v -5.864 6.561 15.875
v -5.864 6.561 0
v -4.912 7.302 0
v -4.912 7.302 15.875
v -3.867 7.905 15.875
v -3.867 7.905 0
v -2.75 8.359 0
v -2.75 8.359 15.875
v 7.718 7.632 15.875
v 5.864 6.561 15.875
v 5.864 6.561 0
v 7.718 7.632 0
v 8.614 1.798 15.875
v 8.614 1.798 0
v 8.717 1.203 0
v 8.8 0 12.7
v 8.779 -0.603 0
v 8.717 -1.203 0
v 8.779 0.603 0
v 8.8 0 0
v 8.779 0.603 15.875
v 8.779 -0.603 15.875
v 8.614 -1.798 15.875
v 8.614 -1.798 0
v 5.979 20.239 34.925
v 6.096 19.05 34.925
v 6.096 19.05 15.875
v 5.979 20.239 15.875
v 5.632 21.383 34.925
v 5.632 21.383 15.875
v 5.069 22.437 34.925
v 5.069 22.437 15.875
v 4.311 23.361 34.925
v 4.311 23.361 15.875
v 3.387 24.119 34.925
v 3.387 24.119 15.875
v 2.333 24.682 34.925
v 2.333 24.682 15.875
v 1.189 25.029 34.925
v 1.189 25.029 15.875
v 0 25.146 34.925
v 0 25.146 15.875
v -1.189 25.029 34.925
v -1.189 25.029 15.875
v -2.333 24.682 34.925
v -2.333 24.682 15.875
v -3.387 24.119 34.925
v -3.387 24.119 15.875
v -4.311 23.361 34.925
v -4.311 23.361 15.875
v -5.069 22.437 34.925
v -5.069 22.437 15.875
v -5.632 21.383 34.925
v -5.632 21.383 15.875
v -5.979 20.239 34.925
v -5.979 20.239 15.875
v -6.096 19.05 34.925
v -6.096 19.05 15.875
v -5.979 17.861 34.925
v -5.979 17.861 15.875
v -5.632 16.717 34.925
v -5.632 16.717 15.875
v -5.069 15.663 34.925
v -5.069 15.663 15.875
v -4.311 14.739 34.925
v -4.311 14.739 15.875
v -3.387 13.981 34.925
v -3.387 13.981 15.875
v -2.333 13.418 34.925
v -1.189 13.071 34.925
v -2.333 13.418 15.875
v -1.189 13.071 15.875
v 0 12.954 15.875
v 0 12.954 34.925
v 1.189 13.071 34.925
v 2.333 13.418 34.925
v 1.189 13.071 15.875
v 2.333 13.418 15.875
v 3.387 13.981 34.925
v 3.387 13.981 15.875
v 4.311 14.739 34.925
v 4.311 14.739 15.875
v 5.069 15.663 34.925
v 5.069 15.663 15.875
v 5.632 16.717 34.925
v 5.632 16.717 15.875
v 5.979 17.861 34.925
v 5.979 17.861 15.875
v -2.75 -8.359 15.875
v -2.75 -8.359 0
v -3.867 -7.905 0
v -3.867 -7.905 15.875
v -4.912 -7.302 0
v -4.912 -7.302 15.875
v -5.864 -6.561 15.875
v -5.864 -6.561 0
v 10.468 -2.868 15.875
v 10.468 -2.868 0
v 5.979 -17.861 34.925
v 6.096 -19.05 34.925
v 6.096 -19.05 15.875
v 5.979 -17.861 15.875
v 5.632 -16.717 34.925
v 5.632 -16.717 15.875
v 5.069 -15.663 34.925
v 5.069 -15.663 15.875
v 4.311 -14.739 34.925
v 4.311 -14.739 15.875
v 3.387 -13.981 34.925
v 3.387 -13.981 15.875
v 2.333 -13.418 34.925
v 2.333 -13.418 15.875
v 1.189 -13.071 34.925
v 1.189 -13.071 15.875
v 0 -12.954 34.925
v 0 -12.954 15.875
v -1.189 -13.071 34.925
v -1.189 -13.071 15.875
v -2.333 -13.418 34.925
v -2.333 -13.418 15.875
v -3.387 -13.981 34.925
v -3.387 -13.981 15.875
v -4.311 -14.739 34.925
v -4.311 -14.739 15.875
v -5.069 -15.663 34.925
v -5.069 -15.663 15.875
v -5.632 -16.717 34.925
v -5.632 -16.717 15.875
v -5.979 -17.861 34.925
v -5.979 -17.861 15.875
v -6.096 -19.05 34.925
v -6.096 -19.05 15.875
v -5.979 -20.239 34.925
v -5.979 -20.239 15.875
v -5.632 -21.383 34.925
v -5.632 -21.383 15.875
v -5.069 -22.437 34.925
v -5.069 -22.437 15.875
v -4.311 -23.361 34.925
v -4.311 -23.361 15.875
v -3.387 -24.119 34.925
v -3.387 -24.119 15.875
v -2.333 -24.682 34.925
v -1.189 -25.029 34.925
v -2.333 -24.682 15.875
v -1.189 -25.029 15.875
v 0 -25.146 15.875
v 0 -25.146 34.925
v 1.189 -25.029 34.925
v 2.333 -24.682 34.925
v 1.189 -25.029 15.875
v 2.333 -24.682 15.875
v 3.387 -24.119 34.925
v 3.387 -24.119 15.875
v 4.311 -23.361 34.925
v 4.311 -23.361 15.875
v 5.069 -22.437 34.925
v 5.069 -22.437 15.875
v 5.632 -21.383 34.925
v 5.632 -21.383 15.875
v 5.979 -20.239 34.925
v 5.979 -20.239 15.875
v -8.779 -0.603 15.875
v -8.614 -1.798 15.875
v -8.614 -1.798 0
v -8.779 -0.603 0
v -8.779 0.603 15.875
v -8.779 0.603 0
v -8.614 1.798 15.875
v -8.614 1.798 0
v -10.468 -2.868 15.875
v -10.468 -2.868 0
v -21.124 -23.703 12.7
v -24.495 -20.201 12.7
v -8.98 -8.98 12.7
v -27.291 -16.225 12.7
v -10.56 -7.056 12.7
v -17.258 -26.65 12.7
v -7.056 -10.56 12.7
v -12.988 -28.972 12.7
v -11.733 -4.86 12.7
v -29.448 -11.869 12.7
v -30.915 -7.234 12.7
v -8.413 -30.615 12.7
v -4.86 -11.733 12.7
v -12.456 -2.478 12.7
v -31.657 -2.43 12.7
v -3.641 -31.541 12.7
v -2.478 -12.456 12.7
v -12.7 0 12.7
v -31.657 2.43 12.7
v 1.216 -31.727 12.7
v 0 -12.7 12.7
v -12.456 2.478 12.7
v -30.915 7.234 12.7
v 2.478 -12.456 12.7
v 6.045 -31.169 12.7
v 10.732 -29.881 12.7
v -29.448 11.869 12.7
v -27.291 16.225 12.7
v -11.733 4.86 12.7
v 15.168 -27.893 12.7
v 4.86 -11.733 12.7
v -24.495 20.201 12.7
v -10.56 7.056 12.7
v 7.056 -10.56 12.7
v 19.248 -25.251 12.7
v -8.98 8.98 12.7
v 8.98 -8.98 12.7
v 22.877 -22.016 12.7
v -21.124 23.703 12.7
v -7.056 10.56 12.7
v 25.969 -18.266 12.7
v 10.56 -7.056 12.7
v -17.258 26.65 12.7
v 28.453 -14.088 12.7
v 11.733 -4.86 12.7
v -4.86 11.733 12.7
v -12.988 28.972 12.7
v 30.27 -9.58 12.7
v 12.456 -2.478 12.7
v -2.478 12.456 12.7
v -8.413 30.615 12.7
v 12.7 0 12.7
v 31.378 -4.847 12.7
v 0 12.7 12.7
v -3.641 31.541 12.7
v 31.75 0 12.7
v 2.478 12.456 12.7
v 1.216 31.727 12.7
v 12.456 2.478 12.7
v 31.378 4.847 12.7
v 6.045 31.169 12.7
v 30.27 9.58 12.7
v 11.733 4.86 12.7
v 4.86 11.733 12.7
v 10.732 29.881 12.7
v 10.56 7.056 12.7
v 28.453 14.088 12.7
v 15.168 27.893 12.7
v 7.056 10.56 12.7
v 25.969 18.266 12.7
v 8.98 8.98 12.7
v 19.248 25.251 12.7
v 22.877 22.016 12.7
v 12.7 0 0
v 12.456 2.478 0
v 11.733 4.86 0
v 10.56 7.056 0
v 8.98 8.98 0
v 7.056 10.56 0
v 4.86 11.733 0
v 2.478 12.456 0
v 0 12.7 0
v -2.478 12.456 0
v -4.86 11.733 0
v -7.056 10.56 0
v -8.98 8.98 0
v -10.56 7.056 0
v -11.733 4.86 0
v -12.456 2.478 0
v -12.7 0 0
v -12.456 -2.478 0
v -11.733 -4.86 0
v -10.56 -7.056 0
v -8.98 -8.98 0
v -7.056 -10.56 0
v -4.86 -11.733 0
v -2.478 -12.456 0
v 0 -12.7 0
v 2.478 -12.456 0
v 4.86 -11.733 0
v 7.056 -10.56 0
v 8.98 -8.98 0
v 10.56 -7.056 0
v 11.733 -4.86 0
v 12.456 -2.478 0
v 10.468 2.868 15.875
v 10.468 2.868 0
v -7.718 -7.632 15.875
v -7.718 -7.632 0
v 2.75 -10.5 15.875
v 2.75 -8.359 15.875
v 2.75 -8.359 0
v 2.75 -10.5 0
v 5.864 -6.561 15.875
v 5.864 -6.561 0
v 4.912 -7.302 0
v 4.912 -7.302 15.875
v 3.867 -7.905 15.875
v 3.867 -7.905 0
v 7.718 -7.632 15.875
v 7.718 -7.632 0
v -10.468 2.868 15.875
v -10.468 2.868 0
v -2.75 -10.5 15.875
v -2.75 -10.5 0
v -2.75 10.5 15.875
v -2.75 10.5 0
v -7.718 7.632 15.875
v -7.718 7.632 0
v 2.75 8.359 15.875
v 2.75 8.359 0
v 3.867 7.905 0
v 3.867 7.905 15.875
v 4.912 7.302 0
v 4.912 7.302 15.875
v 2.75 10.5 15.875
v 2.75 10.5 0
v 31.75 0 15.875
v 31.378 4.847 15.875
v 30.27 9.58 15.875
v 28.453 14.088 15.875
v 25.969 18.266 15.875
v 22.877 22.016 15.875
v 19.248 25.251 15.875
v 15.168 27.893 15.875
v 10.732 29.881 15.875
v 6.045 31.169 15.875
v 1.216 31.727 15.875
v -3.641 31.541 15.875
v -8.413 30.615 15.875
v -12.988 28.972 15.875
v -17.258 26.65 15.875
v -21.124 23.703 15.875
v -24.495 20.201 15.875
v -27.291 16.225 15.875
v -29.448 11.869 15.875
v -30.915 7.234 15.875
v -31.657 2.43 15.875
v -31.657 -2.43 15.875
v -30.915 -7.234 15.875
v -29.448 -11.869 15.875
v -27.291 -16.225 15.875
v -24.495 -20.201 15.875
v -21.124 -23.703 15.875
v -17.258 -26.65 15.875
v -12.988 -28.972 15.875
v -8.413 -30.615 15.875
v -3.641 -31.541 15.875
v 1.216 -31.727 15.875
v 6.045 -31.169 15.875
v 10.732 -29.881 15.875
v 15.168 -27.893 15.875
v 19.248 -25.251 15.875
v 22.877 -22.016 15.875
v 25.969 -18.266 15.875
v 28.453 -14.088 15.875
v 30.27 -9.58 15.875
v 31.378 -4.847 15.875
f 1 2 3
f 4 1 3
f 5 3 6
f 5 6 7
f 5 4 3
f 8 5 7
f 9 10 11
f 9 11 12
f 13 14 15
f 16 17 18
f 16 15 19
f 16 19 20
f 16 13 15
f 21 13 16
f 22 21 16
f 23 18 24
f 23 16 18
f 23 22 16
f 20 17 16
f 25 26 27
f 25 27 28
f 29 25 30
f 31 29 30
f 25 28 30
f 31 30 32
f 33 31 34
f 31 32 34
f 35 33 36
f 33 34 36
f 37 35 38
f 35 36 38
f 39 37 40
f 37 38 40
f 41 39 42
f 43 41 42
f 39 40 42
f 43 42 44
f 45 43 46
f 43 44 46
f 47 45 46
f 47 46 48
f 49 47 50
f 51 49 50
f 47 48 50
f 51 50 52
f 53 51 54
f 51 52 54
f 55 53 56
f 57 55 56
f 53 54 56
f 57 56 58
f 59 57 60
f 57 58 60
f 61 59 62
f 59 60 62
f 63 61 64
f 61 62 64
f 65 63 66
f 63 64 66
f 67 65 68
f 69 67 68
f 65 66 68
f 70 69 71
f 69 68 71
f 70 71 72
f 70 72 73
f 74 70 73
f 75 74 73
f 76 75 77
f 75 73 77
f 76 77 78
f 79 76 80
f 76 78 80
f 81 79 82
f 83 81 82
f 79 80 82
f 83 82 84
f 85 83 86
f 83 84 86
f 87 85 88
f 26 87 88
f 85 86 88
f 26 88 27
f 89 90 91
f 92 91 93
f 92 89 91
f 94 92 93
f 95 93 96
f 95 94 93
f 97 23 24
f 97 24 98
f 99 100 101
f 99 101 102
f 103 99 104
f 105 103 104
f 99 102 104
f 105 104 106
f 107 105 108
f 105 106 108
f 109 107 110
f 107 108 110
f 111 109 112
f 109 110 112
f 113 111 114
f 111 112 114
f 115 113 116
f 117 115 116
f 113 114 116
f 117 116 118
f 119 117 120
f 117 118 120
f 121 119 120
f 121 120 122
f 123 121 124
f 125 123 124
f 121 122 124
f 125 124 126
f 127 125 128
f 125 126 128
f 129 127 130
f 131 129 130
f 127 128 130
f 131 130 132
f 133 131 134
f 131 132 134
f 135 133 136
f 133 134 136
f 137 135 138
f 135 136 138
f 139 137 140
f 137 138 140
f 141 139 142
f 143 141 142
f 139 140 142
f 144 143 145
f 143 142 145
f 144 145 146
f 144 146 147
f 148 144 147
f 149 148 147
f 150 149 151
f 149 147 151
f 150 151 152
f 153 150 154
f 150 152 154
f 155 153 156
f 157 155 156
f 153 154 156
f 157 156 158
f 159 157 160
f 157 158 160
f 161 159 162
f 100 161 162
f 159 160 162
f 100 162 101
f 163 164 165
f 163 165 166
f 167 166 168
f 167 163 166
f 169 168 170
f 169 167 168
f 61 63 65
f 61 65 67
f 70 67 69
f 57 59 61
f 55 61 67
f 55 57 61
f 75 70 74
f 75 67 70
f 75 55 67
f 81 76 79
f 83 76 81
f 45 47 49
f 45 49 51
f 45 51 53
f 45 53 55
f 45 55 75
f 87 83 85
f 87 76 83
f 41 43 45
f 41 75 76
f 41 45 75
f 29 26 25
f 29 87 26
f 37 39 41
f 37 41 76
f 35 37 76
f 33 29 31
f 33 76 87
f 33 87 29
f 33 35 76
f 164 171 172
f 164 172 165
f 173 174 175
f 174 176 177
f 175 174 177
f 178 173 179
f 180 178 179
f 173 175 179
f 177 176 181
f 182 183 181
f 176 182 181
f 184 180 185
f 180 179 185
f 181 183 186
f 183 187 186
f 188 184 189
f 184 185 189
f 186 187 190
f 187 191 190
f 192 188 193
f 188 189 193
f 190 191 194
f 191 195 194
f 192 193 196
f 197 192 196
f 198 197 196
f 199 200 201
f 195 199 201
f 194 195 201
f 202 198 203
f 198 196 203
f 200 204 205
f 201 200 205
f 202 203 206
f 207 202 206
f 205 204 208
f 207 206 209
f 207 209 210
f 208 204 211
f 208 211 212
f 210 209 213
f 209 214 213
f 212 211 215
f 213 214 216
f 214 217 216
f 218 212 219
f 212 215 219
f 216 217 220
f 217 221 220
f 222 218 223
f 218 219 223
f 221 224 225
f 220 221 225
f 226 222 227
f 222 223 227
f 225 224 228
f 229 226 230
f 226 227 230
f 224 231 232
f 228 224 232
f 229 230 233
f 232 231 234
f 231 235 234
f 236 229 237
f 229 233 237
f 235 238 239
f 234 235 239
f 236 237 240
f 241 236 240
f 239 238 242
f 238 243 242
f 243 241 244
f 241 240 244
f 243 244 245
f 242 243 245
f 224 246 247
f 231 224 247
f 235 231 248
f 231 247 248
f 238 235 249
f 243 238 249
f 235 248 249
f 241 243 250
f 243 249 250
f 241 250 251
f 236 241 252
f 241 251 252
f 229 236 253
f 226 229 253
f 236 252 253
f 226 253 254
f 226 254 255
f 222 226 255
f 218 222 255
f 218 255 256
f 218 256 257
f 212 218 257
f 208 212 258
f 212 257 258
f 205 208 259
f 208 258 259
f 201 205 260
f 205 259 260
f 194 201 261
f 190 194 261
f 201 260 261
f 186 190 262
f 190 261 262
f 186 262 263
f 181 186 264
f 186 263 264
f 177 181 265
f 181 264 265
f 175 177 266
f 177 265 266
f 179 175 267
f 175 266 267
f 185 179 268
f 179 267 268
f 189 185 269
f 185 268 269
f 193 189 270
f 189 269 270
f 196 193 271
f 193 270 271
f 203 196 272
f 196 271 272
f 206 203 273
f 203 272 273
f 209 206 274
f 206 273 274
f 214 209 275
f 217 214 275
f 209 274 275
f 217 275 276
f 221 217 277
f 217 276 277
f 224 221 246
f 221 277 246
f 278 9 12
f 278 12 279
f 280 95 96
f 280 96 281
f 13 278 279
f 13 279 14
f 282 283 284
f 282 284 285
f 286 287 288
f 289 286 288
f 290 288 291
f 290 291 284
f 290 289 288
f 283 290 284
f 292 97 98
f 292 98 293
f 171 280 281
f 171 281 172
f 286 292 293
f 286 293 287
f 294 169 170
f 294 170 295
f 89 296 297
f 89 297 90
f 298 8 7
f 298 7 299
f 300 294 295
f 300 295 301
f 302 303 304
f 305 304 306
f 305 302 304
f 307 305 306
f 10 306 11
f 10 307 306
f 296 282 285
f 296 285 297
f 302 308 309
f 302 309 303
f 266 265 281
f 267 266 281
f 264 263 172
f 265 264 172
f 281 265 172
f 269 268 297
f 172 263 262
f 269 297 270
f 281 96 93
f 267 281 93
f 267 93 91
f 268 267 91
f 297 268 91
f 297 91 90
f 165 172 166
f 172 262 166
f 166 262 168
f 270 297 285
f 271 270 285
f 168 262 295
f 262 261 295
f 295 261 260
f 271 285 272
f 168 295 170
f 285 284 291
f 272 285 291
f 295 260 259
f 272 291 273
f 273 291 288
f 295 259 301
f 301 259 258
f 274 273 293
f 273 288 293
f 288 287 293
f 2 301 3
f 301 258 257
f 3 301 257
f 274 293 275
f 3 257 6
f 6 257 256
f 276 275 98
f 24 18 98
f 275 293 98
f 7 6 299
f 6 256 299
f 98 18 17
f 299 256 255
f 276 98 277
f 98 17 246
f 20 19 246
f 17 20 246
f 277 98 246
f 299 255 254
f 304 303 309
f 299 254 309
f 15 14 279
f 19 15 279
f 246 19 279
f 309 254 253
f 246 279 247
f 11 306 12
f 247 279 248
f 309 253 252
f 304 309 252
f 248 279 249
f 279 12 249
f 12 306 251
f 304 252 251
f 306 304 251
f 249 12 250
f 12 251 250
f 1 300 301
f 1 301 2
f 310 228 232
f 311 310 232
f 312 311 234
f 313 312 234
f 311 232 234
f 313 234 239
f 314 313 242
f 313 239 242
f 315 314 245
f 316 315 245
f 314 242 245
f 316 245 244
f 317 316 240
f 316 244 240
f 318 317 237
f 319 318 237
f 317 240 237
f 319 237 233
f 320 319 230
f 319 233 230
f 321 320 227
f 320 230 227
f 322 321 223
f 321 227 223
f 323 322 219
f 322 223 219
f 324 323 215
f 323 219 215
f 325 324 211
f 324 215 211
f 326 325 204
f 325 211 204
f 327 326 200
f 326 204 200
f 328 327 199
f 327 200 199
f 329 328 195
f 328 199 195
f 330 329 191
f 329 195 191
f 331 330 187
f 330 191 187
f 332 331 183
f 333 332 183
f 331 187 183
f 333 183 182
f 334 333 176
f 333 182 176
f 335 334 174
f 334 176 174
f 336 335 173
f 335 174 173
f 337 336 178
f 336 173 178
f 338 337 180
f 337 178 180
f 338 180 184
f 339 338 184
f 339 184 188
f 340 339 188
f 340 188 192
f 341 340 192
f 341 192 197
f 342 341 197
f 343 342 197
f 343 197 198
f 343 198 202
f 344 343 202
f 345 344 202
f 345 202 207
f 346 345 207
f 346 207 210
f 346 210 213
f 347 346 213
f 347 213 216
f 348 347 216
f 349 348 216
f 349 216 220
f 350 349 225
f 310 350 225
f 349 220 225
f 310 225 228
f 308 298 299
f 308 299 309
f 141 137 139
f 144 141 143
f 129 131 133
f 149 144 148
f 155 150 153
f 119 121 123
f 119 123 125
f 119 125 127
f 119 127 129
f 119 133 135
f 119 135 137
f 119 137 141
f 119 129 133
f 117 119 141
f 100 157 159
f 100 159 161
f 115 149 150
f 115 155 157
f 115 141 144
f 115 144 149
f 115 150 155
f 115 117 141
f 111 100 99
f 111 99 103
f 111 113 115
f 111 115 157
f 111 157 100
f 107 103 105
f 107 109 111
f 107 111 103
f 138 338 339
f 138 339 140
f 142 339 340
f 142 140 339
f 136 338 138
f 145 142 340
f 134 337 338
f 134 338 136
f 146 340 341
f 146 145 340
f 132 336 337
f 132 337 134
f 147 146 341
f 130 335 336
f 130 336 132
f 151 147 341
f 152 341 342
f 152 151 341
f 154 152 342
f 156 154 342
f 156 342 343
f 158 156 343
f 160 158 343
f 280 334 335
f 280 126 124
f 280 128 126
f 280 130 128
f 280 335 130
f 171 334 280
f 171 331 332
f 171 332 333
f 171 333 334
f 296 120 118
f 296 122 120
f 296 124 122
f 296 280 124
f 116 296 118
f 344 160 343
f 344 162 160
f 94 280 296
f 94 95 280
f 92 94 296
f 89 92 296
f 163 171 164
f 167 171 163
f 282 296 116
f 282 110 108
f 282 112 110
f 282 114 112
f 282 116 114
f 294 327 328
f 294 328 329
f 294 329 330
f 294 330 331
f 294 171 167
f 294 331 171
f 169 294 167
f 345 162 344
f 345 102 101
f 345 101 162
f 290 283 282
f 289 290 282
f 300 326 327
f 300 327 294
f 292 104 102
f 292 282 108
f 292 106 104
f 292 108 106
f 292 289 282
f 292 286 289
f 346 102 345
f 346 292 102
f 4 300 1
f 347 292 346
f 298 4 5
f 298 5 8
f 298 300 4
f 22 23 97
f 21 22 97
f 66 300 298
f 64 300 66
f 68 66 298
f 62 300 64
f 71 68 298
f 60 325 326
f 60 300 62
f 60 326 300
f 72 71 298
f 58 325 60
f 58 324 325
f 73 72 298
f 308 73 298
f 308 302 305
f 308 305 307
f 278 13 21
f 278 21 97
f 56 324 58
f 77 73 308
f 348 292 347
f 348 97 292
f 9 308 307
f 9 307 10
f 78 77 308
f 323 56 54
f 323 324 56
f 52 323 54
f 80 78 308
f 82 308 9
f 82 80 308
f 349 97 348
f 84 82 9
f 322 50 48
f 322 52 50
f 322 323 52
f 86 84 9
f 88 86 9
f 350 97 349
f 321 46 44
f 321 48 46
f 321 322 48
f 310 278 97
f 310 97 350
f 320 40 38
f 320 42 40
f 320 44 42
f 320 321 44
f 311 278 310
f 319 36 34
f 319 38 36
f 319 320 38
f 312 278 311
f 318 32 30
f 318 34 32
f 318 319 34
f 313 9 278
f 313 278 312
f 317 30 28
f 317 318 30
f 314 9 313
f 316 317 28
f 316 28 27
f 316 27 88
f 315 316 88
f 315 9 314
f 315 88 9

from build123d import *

# Parameters (mm, degrees)
F0_R     = 12.7
F1_DEPTH = 12.7
F4_R     = 31.75
F5_DEPTH = 3.175
F6_R     = 6.096
F7_DEPTH = 19.05
F8_DEPTH = 25.4


with BuildPart() as f1:
    # F0 (on Top) → F1 (new body)
    with BuildSketch(Plane.XY):
        Circle(F0_R)
        with BuildLine():
            ThreePointArc((8.614346, 1.798068), (8.753463, 0.903814), (8.8, 0))
            ThreePointArc((8.8, 0), (8.753463, -0.903814), (8.614346, -1.798068))
            Line((8.614346, -1.798068), (10.468267, -2.86843))
            Line((10.468267, -2.86843), (7.718267, -7.63157))
            Line((7.718267, -7.63157), (5.864346, -6.561208))
            ThreePointArc((5.864346, -6.561208), (4.4, -7.621024), (2.75, -8.359276))
            Line((2.75, -8.359276), (2.75, -10.5))
            Line((2.75, -10.5), (-2.75, -10.5))
            Line((-2.75, -10.5), (-2.75, -8.359276))
            ThreePointArc((-2.75, -8.359276), (-4.4, -7.621024), (-5.864346, -6.561208))
            Line((-5.864346, -6.561208), (-7.718267, -7.63157))
            Line((-7.718267, -7.63157), (-10.468267, -2.86843))
            Line((-10.468267, -2.86843), (-8.614346, -1.798068))
            ThreePointArc((-8.614346, -1.798068), (-8.8, 0), (-8.614346, 1.798068))
            Line((-8.614346, 1.798068), (-10.468267, 2.86843))
            Line((-10.468267, 2.86843), (-7.718267, 7.63157))
            Line((-7.718267, 7.63157), (-5.864346, 6.561208))
            ThreePointArc((-5.864346, 6.561208), (-4.4, 7.621024), (-2.75, 8.359276))
            Line((-2.75, 8.359276), (-2.75, 10.5))
            Line((-2.75, 10.5), (2.75, 10.5))
            Line((2.75, 10.5), (2.75, 8.359276))
            ThreePointArc((2.75, 8.359276), (4.4, 7.621024), (5.864346, 6.561208))
            Line((5.864346, 6.561208), (7.718267, 7.63157))
            Line((7.718267, 7.63157), (10.468267, 2.86843))
            Line((10.468267, 2.86843), (8.614346, 1.798068))
        make_face(mode=Mode.SUBTRACT)
    extrude(amount=F1_DEPTH)

    # F4 (on face) → F5 (join)
    with BuildSketch(Plane.XY.offset(12.7)):
        Circle(F4_R)
    extrude(amount=F5_DEPTH)

    # F6 (on face) → F7 (join)
    with BuildSketch(Plane.XY.offset(15.875)):
        with Locations((0, 19.05)):
            Circle(F6_R)
        with Locations((0, -19.05)):
            Circle(F6_R)
    extrude(amount=F7_DEPTH)

    # F5_face (on face) → F8 (cut)
    with BuildSketch(Plane.XY.offset(15.875)):
        with BuildLine():
            Line((5.864346, 6.561208), (7.718267, 7.63157))
            Line((7.718267, 7.63157), (10.468267, 2.86843))
            Line((10.468267, 2.86843), (8.614346, 1.798068))
            ThreePointArc((8.614346, 1.798068), (8.8, 0), (8.614346, -1.798068))
            Line((8.614346, -1.798068), (10.468267, -2.86843))
            Line((10.468267, -2.86843), (7.718267, -7.63157))
            Line((7.718267, -7.63157), (5.864346, -6.561208))
            ThreePointArc((5.864346, -6.561208), (4.4, -7.621024), (2.75, -8.359276))
            Line((2.75, -8.359276), (2.75, -10.5))
            Line((2.75, -10.5), (-2.75, -10.5))
            Line((-2.75, -10.5), (-2.75, -8.359276))
            ThreePointArc((-2.75, -8.359276), (-4.4, -7.621024), (-5.864346, -6.561208))
            Line((-5.864346, -6.561208), (-7.718267, -7.63157))
            Line((-7.718267, -7.63157), (-10.468267, -2.86843))
            Line((-10.468267, -2.86843), (-8.614346, -1.798068))
            ThreePointArc((-8.614346, -1.798068), (-8.8, 0), (-8.614346, 1.798068))
            Line((-8.614346, 1.798068), (-10.468267, 2.86843))
            Line((-10.468267, 2.86843), (-7.718267, 7.63157))
            Line((-7.718267, 7.63157), (-5.864346, 6.561208))
            ThreePointArc((-5.864346, 6.561208), (-4.4, 7.621024), (-2.75, 8.359276))
            Line((-2.75, 8.359276), (-2.75, 10.5))
            Line((-2.75, 10.5), (2.75, 10.5))
            Line((2.75, 10.5), (2.75, 8.359276))
            ThreePointArc((2.75, 8.359276), (4.4, 7.621024), (5.864346, 6.561208))
        make_face()
    extrude(amount=-F8_DEPTH, mode=Mode.SUBTRACT)


solid = f1.part
